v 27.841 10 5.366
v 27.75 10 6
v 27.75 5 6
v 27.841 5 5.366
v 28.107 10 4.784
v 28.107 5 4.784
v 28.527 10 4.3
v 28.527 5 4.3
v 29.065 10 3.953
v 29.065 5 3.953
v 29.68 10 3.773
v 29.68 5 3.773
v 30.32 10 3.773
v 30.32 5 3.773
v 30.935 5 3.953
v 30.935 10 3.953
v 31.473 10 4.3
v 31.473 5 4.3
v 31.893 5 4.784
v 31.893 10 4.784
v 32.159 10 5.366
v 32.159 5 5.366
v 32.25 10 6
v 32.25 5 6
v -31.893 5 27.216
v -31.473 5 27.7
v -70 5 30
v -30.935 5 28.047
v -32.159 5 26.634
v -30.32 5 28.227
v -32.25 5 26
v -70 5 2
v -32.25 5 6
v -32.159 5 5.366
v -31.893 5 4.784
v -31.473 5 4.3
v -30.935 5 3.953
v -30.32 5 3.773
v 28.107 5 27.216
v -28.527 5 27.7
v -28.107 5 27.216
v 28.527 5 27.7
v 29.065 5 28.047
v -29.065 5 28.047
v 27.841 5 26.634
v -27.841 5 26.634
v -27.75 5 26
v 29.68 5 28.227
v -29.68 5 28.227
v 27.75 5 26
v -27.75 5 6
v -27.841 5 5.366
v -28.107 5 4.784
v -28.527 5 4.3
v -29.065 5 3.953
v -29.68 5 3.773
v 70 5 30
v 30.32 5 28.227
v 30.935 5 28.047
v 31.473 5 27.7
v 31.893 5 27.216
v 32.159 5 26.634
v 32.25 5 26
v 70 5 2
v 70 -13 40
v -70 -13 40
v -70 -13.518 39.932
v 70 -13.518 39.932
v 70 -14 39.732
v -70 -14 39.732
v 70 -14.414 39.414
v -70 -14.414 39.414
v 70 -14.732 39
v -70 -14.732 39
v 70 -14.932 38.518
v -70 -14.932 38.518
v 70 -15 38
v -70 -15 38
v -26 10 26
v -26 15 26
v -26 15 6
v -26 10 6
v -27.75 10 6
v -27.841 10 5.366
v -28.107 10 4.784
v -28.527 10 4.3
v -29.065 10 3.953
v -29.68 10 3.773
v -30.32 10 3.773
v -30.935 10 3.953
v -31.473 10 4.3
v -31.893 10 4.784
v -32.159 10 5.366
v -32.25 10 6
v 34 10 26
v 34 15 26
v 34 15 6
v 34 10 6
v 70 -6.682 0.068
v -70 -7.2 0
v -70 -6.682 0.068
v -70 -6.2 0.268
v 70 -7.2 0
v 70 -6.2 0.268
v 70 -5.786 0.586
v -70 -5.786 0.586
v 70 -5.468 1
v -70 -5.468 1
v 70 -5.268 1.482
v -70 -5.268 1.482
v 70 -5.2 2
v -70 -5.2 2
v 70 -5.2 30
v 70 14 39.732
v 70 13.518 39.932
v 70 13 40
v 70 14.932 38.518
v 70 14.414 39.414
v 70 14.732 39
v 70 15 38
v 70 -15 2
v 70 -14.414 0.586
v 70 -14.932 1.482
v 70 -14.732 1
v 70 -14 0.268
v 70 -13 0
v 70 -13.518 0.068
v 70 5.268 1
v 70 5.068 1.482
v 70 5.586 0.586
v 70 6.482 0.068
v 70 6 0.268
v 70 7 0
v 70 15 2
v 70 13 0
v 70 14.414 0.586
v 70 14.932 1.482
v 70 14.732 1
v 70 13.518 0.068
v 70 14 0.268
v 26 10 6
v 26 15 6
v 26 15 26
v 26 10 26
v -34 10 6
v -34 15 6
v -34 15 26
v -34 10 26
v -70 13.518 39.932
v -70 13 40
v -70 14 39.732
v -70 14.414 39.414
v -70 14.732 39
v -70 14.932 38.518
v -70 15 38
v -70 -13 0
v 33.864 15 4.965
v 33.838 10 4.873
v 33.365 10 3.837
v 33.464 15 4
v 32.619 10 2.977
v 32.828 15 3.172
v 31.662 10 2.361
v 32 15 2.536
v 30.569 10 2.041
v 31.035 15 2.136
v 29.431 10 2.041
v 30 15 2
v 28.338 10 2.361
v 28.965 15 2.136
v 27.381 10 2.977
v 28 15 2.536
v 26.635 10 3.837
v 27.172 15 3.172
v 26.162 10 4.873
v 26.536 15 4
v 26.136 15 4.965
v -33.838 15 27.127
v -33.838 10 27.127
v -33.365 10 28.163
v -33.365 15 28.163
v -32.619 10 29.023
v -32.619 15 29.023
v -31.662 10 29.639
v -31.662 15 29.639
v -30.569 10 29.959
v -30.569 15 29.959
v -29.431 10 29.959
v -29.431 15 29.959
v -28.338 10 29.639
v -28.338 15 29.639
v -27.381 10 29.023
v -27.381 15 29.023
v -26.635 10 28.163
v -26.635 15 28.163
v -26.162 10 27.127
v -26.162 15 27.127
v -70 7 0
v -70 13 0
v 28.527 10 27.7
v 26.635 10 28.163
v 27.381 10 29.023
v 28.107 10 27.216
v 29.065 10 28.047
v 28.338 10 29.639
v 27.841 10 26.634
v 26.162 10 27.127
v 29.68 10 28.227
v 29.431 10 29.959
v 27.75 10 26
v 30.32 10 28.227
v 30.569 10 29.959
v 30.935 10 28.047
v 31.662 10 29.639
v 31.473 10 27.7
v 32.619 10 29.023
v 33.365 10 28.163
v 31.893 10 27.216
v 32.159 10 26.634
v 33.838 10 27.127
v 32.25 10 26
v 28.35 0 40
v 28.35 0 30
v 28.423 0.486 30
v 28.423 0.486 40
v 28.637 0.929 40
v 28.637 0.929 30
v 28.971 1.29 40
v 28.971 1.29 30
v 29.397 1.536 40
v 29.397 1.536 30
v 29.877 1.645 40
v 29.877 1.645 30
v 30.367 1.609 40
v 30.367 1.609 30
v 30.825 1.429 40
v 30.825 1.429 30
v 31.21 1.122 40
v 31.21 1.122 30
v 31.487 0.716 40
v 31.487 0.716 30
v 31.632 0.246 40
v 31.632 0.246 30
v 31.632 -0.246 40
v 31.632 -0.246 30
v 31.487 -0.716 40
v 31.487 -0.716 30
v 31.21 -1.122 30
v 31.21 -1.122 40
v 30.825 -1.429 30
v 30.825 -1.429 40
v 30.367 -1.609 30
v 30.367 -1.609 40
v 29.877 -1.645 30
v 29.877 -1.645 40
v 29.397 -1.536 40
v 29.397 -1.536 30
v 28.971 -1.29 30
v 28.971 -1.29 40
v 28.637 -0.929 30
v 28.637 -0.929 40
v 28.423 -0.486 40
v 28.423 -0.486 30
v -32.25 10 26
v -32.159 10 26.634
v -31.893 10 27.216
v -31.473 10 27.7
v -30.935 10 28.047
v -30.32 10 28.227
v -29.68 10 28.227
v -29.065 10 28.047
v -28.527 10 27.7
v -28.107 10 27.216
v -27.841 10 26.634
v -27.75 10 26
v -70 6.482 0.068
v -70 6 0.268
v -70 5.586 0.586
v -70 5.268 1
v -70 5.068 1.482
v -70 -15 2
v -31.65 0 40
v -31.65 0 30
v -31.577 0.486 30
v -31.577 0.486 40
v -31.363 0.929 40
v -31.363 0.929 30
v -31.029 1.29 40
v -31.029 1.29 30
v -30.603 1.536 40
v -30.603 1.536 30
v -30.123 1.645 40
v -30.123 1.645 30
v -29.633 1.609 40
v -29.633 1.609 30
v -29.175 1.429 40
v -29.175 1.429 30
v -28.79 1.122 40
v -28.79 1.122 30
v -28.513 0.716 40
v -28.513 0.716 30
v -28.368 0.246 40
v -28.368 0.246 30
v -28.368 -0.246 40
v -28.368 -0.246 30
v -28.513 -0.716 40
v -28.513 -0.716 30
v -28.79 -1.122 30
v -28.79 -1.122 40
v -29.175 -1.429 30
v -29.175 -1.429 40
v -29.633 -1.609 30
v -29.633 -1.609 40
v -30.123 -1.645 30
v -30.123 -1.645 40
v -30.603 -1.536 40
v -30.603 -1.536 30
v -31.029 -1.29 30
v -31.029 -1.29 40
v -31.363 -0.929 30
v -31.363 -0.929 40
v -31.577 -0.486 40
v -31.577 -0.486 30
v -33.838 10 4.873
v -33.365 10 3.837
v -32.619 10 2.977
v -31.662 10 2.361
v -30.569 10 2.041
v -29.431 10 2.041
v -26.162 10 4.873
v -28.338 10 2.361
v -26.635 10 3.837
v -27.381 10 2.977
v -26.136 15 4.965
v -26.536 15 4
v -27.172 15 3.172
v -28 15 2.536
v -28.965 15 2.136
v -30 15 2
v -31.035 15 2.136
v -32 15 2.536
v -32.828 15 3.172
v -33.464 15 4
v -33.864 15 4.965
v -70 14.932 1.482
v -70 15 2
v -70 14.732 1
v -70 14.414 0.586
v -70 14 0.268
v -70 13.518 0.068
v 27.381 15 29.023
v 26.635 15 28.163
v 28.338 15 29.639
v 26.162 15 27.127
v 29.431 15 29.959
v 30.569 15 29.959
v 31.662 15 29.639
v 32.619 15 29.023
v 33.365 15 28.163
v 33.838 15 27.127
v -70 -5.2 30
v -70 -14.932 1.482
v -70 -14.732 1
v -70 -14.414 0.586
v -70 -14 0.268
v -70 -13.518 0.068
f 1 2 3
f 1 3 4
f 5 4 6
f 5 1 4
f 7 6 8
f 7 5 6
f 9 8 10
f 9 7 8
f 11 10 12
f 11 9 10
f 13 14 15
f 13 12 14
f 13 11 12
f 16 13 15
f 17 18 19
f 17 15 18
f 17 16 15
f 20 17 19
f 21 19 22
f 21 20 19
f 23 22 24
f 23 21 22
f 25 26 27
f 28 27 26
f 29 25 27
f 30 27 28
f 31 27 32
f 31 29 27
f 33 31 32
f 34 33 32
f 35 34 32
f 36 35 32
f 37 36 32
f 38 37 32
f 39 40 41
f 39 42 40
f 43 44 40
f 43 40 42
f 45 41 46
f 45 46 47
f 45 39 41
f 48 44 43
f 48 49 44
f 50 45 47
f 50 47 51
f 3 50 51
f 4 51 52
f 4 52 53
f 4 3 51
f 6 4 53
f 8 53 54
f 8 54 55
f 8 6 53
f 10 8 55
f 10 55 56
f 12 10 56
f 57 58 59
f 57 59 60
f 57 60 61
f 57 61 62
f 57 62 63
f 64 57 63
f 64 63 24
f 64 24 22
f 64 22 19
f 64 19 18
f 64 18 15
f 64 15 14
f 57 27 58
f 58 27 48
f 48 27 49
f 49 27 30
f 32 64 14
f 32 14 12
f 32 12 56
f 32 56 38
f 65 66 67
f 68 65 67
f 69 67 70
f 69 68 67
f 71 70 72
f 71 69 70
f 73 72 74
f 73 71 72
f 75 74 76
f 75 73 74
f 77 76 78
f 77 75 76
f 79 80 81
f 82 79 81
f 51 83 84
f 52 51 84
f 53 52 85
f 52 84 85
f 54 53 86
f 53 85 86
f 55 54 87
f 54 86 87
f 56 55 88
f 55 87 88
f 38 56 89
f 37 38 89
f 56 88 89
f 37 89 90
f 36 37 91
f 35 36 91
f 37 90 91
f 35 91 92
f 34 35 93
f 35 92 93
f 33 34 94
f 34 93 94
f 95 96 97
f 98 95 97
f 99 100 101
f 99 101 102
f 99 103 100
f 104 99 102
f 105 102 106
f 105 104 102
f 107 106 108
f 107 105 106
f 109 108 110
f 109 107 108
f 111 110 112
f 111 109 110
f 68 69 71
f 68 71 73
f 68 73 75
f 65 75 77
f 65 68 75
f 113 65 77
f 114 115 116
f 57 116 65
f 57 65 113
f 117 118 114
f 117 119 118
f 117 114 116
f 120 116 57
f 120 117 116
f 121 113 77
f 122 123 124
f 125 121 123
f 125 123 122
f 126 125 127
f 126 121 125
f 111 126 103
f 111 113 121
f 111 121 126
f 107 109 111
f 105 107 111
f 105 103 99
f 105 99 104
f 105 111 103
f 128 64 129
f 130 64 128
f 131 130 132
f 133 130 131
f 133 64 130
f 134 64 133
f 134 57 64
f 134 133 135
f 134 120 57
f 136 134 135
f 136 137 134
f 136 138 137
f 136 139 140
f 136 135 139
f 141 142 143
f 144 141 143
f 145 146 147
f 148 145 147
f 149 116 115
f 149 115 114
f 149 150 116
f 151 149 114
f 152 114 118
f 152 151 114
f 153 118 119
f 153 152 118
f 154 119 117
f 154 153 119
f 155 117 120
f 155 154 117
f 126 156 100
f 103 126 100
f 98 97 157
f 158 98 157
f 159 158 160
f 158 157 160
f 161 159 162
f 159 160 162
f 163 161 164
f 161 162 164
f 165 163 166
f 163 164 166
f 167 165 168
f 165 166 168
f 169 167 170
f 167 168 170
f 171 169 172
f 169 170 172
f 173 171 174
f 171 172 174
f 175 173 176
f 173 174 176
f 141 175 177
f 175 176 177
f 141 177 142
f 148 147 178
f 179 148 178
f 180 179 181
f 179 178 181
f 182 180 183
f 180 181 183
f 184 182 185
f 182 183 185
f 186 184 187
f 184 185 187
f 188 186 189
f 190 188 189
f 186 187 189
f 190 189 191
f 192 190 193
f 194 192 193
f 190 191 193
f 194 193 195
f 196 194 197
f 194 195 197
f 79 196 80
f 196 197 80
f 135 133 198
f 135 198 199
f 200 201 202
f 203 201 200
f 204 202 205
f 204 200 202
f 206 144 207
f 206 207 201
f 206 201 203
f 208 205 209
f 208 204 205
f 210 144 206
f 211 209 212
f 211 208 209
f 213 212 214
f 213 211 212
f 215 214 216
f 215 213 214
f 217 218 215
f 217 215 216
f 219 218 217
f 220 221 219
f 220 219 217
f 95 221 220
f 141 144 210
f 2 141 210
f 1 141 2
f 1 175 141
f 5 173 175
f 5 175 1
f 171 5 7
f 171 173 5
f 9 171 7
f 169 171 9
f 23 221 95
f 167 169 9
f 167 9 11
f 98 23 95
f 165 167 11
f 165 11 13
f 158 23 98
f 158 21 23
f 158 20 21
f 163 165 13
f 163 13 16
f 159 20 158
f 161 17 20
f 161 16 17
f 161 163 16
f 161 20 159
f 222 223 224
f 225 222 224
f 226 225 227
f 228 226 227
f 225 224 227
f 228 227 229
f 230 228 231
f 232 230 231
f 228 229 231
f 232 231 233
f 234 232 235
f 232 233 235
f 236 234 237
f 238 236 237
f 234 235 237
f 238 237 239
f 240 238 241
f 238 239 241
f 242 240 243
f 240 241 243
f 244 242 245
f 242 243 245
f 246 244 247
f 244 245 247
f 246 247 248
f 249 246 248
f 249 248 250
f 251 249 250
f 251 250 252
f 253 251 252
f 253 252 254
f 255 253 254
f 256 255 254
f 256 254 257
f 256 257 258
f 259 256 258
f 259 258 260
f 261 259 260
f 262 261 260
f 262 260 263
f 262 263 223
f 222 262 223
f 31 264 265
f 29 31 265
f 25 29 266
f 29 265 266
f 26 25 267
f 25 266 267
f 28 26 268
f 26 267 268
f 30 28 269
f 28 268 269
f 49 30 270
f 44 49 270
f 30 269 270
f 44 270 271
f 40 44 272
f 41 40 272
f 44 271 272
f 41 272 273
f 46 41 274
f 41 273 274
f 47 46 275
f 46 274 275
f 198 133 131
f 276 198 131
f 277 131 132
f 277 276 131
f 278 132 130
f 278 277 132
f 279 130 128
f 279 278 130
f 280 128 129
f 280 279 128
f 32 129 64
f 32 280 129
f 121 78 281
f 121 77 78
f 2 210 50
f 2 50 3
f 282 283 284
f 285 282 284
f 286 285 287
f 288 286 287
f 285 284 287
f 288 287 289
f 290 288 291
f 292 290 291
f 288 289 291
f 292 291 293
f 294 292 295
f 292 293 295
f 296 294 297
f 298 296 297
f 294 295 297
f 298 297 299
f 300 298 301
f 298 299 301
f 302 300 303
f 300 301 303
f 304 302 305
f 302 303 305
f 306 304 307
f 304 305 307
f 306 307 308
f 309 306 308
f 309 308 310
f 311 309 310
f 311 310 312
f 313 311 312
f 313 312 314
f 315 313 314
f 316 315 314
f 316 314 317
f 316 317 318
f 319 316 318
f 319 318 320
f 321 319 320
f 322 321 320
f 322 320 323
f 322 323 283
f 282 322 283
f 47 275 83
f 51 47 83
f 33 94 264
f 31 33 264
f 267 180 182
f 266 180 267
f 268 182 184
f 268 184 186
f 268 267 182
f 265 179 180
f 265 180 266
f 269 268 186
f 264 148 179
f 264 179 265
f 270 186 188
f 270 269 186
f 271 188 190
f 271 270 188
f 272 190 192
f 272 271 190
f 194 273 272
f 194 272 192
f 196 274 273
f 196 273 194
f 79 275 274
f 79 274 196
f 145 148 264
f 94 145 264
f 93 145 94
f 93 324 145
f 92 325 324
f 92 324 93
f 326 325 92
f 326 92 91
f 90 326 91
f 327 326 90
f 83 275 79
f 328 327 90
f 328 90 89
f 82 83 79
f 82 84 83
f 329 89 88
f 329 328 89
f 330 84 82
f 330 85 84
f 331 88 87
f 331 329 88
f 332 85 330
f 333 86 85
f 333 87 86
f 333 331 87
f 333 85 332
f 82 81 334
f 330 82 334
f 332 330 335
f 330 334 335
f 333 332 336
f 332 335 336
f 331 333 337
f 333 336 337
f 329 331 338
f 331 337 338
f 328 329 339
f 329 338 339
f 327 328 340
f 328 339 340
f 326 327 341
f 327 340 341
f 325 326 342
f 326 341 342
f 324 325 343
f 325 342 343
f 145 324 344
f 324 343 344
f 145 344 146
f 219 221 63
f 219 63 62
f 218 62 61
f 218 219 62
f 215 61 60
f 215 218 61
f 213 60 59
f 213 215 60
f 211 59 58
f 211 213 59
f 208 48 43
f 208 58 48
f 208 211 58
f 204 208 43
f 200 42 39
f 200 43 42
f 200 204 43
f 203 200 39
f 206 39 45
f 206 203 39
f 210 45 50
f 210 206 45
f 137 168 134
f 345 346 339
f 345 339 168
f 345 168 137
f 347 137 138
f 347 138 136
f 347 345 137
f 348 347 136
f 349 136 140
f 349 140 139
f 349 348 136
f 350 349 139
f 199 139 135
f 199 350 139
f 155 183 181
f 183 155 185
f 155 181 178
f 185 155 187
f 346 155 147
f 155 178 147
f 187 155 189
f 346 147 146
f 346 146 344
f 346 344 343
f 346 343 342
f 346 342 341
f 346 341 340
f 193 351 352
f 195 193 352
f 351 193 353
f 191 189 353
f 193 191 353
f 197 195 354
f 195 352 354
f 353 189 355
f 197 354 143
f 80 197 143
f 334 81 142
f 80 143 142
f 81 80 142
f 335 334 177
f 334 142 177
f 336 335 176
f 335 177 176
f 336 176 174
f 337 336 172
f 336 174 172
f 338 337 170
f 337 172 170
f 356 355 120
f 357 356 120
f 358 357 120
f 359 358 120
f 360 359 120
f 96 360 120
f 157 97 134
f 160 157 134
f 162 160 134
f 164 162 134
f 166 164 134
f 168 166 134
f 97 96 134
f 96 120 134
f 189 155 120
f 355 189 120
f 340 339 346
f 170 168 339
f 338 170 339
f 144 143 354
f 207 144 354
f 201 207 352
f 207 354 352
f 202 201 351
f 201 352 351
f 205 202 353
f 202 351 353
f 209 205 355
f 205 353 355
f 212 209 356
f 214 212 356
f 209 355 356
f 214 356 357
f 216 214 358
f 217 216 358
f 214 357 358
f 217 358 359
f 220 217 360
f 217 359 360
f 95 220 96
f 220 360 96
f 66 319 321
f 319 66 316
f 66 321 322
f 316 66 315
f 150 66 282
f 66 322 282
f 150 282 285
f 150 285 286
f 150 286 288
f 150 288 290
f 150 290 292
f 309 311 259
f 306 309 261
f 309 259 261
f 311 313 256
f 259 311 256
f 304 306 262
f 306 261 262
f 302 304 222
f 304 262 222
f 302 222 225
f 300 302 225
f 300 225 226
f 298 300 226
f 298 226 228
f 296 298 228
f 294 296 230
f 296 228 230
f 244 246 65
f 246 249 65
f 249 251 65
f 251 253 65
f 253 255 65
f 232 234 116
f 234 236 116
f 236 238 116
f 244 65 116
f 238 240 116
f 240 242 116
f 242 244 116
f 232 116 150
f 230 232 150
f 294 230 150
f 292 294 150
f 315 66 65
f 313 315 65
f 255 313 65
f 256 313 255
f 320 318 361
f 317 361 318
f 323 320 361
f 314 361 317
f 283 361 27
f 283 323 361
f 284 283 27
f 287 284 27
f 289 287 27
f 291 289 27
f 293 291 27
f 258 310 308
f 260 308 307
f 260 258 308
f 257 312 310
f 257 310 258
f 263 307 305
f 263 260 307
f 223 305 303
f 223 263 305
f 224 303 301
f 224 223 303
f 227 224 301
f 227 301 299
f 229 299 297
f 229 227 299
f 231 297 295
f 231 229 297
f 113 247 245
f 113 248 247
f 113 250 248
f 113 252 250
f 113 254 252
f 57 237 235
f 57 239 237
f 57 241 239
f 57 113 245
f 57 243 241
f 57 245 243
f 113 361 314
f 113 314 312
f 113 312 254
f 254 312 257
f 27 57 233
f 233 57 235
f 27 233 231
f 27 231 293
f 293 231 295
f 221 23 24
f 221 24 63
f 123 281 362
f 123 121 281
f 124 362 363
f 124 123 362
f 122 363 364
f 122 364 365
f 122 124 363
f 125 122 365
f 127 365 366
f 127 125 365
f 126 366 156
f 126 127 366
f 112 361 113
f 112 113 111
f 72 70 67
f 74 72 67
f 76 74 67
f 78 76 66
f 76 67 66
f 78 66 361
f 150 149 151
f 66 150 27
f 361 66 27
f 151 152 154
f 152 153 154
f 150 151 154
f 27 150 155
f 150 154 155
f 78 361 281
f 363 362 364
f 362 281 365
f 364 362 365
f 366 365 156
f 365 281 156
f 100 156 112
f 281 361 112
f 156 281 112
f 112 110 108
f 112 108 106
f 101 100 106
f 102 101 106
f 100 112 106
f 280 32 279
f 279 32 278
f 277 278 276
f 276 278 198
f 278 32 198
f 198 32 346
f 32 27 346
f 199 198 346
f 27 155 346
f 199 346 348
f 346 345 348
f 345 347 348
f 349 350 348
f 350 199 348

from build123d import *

# Parameters (mm, degrees)
ESQUISSE1_W             = 40
ESQUISSE1_H             = 30
BOSS_EXTRU_1_DEPTH      = 70
ESQUISSE2_W             = 30
ESQUISSE2_H             = 10.2
ENL_V_MAT_EXTRU_1_DEPTH = 100
CONG_1_R                = 2
ENL_V_MAT_EXTRU_2_REACH = 88.023
ENL_V_MAT_EXTRU_3_DEPTH = 5
TROU_TARAUD_M41_D       = 3.3


with BuildPart() as part:
    # Esquisse1 → Boss.-Extru.1 (new, symmetric)
    with BuildSketch(Plane(origin=(0, 0, 0), x_dir=(0, 0, -1), z_dir=(1, 0, 0))):
        with Locations((-20, 0)):
            Rectangle(ESQUISSE1_W, ESQUISSE1_H)
    extrude(amount=BOSS_EXTRU_1_DEPTH, both=True)

    # Esquisse2 → Enlèv. mat.-Extru.1 (cut, symmetric)
    with BuildSketch(Plane(origin=(0, 0, 0), x_dir=(0, 0, -1), z_dir=(1, 0, 0))):
        with Locations((-15, -0.1)):
            Rectangle(ESQUISSE2_W, ESQUISSE2_H)
    extrude(amount=ENL_V_MAT_EXTRU_1_DEPTH, both=True, mode=Mode.SUBTRACT)

    # Congé1
    cong_1_edges = [part.edges().sort_by_distance(p)[0] for p in [
        (0, 5, 0),
        (0, -5.2, 0),
        (0, -15, 0),
        (0, -15, 40),
        (0, 15, 40),
        (0, 15, 0),
    ]]
    fillet(cong_1_edges, radius=CONG_1_R)

    # Esquisse5 → Enlèv. mat.-Extru.2 (cut, up to next)
    with BuildSketch(Plane(origin=(0, 15, 0), x_dir=(1, 0, 0), z_dir=(0, 1, 0)), mode=Mode.PRIVATE) as enl_v_mat_extru_2_sk1:
        with BuildLine():
            Line((-32.25, -6), (-32.25, -26))
            ThreePointArc((-32.25, -26), (-30, -28.25), (-27.75, -26))
            Line((-27.75, -26), (-27.75, -6))
            ThreePointArc((-27.75, -6), (-30, -3.75), (-32.25, -6))
        make_face()
    enl_v_mat_extru_2_tool1 = extrude(enl_v_mat_extru_2_sk1.sketch, amount=-ENL_V_MAT_EXTRU_2_REACH, mode=Mode.PRIVATE) & part.part
    # Esquisse5 → Enlèv. mat.-Extru.2 (cut, up to next)
    with BuildSketch(Plane(origin=(0, 15, 0), x_dir=(1, 0, 0), z_dir=(0, 1, 0)), mode=Mode.PRIVATE) as enl_v_mat_extru_2_sk2:
        with BuildLine():
            Line((32.25, -6), (32.25, -26))
            ThreePointArc((32.25, -26), (30, -28.25), (27.75, -26))
            Line((27.75, -26), (27.75, -6))
            ThreePointArc((27.75, -6), (30, -3.75), (32.25, -6))
        make_face()
    enl_v_mat_extru_2_tool2 = extrude(enl_v_mat_extru_2_sk2.sketch, amount=-ENL_V_MAT_EXTRU_2_REACH, mode=Mode.PRIVATE) & part.part
    add(enl_v_mat_extru_2_tool1.solids().sort_by_distance((-30, 15, 16))[0], mode=Mode.SUBTRACT)
    add(enl_v_mat_extru_2_tool2.solids().sort_by_distance((30, 15, 16))[0], mode=Mode.SUBTRACT)

    # Esquisse6 → Enlèv. mat.-Extru.3 (cut)
    with BuildSketch(Plane(origin=(0, 15, 0), x_dir=(1, 0, 0), z_dir=(0, 1, 0))):
        with BuildLine():
            Line((-34, -6), (-34, -26))
            ThreePointArc((-34, -26), (-30, -30), (-26, -26))
            Line((-26, -26), (-26, -6))
            ThreePointArc((-26, -6), (-30, -2), (-34, -6))
        make_face()
        with BuildLine():
            Line((26, -6), (26, -26))
            ThreePointArc((26, -26), (30, -30), (34, -26))
            Line((34, -26), (34, -6))
            ThreePointArc((34, -6), (30, -2), (26, -6))
        make_face()
    extrude(amount=-ENL_V_MAT_EXTRU_3_DEPTH, mode=Mode.SUBTRACT)

    # Trou taraudé M41 (through all)
    with Locations(Plane.XY.offset(40)):
        with Locations((-30, 0), (30, 0)):
            Hole(TROU_TARAUD_M41_D / 2)


solid = part.part
